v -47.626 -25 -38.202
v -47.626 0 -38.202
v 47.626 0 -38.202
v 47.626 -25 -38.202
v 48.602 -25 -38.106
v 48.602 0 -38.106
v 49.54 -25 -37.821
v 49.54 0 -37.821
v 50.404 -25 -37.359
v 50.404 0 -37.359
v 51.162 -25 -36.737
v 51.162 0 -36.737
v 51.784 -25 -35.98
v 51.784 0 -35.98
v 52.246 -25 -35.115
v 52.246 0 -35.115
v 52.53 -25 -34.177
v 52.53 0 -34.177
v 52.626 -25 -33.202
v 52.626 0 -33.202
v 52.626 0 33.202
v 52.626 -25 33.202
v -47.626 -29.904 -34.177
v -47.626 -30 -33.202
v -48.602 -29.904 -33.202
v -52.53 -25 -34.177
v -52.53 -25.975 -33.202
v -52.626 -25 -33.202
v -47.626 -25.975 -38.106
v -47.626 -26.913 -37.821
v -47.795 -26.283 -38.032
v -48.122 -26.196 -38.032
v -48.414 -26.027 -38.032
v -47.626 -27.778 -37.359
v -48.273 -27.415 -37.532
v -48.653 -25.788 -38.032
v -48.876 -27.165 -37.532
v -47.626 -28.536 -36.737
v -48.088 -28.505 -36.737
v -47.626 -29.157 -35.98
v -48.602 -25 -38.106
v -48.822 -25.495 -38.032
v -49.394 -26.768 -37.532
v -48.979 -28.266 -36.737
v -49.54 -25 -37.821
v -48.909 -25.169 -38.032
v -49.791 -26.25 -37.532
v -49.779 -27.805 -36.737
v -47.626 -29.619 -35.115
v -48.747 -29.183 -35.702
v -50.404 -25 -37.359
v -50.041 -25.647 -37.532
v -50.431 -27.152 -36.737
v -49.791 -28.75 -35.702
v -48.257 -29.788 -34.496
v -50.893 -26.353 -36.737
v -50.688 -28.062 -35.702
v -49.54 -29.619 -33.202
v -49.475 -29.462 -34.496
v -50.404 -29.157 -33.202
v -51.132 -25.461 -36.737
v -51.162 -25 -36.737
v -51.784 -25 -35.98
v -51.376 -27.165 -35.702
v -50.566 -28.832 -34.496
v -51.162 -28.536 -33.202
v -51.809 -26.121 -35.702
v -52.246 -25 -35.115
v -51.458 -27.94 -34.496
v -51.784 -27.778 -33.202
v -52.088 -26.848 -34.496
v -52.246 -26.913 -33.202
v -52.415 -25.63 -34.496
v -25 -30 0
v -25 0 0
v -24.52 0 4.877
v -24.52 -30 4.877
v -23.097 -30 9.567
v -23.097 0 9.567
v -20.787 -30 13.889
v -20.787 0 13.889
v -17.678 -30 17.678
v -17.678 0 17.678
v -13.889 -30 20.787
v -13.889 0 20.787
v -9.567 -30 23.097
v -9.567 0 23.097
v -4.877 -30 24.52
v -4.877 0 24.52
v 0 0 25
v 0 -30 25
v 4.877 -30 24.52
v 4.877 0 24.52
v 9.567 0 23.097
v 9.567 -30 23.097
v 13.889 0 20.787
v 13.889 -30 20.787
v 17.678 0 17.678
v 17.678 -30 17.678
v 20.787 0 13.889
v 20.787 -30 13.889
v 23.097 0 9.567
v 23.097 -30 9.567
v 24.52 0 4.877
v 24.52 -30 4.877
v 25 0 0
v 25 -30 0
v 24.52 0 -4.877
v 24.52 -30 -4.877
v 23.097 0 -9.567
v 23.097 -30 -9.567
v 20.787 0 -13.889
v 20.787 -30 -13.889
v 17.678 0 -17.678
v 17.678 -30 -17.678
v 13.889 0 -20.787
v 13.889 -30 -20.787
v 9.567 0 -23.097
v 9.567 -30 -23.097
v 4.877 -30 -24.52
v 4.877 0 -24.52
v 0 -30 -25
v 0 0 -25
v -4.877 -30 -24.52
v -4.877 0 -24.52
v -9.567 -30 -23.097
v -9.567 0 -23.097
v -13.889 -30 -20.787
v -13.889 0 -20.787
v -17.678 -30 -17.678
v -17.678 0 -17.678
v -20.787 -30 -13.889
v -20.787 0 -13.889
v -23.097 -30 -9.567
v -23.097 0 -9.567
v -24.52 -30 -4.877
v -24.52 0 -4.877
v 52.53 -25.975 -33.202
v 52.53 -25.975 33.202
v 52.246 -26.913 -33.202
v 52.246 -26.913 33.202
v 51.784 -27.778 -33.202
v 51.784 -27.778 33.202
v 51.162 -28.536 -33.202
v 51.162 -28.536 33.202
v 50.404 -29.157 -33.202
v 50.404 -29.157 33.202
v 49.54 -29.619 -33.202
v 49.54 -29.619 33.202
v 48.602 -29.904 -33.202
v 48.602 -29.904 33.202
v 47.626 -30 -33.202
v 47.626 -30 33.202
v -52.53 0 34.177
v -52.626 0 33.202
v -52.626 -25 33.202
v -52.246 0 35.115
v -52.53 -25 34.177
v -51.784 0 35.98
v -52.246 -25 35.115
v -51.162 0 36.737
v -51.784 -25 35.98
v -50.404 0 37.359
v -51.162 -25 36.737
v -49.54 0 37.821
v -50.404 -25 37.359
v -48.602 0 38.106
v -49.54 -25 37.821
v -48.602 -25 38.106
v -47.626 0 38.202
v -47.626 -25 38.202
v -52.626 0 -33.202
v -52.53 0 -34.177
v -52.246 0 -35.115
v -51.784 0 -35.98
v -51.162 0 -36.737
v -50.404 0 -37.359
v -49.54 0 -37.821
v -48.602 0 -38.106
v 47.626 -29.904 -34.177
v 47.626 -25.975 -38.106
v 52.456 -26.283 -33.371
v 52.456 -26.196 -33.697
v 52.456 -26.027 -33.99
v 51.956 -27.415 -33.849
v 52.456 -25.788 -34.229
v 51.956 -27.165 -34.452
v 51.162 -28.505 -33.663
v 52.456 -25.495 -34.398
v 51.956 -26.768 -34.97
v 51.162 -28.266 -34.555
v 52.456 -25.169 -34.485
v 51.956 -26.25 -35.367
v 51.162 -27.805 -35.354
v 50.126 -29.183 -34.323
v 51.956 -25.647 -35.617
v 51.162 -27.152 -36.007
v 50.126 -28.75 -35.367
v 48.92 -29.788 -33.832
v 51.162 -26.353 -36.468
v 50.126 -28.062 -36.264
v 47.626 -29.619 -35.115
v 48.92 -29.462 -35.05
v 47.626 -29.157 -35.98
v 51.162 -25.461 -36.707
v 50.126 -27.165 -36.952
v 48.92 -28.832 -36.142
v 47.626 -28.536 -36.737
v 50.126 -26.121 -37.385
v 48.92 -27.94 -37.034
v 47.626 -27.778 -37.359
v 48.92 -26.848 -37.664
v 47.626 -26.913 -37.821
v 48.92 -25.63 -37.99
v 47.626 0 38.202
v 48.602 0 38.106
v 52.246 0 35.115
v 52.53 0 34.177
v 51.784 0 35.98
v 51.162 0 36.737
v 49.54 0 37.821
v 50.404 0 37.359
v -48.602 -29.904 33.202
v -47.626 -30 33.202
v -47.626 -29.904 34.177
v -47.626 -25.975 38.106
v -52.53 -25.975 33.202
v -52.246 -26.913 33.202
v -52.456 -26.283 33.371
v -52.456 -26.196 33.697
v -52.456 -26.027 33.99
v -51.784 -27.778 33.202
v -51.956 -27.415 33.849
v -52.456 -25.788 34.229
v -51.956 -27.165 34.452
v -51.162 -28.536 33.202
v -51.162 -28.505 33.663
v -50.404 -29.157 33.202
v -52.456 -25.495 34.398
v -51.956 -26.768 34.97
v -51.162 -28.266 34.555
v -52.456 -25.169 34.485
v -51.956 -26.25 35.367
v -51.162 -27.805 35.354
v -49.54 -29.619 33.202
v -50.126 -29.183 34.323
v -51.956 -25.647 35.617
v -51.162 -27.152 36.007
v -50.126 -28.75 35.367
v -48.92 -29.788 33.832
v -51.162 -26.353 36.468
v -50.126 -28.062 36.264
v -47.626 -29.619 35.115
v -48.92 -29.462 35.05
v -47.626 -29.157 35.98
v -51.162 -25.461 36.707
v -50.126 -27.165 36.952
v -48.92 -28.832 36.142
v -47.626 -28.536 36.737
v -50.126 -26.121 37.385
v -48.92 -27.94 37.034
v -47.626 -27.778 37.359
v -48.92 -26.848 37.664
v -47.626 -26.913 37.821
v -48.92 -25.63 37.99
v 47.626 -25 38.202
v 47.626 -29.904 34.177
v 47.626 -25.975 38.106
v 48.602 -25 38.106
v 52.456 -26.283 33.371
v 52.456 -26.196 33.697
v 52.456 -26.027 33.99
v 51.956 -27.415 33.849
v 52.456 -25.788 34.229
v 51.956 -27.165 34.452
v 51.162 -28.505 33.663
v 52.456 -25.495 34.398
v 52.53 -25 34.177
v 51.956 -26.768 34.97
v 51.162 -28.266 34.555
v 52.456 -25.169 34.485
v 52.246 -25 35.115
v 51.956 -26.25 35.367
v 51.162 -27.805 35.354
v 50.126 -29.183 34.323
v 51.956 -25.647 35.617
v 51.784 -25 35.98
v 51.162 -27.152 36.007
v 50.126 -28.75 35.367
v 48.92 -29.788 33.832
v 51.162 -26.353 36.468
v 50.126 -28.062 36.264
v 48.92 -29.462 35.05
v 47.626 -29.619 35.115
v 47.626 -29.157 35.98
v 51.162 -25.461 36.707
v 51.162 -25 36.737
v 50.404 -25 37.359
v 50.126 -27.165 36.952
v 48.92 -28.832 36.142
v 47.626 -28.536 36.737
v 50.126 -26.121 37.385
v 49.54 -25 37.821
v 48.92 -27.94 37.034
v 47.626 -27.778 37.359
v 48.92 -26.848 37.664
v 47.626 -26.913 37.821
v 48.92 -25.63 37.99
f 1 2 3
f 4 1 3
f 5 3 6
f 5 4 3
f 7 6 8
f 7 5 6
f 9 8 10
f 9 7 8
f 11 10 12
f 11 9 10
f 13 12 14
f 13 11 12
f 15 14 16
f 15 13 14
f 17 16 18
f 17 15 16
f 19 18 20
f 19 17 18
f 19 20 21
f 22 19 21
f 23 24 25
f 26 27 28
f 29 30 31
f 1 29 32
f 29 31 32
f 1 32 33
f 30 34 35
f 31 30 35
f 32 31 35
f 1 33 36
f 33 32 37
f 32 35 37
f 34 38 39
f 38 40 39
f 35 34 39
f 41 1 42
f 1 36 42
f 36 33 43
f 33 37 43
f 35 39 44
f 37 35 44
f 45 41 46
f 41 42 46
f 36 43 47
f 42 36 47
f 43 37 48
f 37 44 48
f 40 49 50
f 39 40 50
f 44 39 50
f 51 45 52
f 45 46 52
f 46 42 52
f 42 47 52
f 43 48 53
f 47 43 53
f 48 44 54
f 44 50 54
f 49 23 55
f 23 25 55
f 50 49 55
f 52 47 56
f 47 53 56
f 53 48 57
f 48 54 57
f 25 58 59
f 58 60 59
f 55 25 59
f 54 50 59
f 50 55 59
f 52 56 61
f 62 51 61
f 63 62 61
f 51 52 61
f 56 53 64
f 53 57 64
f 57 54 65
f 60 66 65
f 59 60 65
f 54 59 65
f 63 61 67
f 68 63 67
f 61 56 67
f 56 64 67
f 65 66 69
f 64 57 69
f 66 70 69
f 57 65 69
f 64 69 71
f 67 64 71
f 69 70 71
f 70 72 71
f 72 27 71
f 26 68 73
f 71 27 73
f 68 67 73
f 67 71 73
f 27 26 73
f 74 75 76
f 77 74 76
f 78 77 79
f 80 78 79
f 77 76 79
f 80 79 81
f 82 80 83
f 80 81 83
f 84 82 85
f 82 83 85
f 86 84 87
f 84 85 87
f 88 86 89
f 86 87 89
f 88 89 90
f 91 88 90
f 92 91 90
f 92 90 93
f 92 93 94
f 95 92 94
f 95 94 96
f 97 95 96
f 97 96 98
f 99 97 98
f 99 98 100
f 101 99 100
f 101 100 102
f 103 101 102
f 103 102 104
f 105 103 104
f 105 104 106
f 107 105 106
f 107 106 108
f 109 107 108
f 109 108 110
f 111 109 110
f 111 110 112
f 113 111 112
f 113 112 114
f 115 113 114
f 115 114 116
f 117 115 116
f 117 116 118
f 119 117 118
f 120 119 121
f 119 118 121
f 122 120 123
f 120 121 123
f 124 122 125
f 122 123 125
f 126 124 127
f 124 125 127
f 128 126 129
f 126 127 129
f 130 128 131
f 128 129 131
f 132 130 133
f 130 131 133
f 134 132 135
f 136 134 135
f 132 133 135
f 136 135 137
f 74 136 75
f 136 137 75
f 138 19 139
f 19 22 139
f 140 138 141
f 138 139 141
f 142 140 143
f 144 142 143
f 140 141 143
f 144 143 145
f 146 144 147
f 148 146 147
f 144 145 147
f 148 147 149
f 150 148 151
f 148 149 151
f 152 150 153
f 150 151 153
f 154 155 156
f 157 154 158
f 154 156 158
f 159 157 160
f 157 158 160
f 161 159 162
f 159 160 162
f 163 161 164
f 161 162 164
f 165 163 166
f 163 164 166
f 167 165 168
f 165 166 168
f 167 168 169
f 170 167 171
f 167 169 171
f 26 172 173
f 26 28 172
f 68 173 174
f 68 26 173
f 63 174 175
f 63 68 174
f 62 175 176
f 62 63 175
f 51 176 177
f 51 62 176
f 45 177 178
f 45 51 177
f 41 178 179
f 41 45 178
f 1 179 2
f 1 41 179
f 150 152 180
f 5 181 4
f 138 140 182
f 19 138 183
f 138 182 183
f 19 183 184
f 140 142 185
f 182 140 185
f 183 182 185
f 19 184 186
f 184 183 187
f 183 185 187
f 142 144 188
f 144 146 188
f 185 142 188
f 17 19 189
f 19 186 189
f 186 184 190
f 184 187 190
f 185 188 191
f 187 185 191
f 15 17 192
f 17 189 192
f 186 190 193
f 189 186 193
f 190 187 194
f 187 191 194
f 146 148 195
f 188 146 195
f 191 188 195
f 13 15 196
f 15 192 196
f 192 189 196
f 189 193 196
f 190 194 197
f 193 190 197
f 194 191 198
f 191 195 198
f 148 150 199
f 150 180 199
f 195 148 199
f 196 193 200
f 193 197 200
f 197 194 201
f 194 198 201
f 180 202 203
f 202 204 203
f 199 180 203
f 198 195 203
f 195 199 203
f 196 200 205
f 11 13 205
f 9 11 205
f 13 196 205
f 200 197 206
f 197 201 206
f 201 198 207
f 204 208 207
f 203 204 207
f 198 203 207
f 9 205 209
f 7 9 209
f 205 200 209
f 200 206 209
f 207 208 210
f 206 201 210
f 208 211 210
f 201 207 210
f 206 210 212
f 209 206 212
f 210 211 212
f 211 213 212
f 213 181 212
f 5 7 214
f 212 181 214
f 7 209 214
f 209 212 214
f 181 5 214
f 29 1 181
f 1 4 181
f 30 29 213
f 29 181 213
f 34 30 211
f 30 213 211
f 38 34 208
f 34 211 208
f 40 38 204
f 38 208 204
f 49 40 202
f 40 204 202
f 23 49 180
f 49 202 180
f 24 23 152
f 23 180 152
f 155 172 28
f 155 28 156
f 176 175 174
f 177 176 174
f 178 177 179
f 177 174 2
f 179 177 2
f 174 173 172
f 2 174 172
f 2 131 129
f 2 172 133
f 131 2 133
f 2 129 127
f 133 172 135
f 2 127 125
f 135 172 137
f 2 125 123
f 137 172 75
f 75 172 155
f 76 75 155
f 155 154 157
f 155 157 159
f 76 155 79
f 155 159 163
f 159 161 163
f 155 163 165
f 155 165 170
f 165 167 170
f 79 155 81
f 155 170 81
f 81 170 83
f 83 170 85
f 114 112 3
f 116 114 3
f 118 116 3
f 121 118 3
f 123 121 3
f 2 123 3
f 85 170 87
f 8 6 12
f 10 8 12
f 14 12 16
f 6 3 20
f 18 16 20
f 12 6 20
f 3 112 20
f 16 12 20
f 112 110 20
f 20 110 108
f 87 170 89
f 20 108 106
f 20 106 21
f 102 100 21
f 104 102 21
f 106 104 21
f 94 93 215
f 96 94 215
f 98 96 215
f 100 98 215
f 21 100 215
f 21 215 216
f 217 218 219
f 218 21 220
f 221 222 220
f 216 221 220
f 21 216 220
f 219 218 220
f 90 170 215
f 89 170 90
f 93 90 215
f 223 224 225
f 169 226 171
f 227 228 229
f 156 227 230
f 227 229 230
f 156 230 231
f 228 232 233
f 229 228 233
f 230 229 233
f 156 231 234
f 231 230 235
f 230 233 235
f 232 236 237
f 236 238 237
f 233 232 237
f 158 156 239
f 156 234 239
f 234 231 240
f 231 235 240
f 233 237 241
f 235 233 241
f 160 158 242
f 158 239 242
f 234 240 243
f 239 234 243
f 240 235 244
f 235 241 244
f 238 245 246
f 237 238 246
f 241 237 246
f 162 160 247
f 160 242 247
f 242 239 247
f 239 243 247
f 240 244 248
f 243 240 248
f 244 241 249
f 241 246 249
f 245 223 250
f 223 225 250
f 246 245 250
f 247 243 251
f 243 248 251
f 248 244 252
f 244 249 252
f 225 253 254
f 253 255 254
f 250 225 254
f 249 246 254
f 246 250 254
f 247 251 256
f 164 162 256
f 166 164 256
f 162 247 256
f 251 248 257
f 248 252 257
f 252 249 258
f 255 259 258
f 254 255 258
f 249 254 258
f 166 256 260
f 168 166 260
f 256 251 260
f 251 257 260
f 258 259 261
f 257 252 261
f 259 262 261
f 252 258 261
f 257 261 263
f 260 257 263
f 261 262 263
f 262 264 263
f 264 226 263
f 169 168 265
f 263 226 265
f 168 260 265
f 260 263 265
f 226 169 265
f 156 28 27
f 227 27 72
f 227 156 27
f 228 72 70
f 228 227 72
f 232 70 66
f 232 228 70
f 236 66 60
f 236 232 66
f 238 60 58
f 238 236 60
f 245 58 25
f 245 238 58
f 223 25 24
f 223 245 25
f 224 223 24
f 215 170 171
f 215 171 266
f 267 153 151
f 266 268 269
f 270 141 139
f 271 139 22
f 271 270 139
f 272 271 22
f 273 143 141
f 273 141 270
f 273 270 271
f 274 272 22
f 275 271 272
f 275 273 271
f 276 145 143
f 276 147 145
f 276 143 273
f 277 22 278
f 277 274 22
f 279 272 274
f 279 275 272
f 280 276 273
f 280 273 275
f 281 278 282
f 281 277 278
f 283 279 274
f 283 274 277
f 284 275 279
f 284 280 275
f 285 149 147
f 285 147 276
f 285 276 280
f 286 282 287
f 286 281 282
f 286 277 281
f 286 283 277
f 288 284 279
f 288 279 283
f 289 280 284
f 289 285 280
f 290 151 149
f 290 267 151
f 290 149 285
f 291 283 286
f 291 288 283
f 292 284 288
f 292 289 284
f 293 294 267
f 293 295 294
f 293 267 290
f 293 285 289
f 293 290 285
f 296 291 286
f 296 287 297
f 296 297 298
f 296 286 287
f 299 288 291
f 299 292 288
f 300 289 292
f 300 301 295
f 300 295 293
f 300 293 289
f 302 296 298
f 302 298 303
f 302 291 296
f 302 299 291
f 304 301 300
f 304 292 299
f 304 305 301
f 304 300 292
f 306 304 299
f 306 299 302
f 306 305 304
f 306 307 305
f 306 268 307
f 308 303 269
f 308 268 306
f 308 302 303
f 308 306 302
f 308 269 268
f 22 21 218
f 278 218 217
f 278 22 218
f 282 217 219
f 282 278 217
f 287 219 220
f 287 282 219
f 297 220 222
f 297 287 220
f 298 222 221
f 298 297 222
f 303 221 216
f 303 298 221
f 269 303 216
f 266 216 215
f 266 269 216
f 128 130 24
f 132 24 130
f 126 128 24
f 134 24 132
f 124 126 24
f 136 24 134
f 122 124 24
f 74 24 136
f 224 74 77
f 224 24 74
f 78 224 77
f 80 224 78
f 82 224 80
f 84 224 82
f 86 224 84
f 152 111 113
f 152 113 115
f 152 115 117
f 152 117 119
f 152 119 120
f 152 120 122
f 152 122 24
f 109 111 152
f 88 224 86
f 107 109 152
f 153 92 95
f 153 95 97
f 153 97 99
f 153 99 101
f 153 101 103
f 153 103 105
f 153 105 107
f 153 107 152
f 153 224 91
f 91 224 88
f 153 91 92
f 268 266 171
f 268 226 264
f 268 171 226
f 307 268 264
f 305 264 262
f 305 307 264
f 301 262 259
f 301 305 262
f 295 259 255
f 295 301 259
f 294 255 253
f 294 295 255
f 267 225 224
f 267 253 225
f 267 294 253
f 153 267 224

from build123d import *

# Parameters (mm, degrees)
F0_W     = 105.252586
F0_H     = 76.403916
F1_DEPTH = 30
F2_R     = 5
F4_D     = 50


with BuildPart() as f1:
    # F0 (on Front) → F1 (new body)
    with BuildSketch(Plane.XZ):
        Rectangle(F0_W, F0_H)
    extrude(amount=F1_DEPTH)

    # F2
    f2_edges = [f1.edges().sort_by_distance(p)[0] for p in [
        (0, -30, 38.201958),
        (-52.626293, -30, 0),
        (0, -30, -38.201958),
        (52.626293, -30, 0),
        (-52.626293, -15, 38.201958),
        (-52.626293, -15, -38.201958),
        (52.626293, -15, 38.201958),
        (52.626293, -15, -38.201958),
    ]]
    fillet(f2_edges, radius=F2_R)

    # F4 (through all)
    with Locations(Plane.XZ.offset(30)):
        with Locations((0, 0)):
            Hole(F4_D / 2)


solid = f1.part
